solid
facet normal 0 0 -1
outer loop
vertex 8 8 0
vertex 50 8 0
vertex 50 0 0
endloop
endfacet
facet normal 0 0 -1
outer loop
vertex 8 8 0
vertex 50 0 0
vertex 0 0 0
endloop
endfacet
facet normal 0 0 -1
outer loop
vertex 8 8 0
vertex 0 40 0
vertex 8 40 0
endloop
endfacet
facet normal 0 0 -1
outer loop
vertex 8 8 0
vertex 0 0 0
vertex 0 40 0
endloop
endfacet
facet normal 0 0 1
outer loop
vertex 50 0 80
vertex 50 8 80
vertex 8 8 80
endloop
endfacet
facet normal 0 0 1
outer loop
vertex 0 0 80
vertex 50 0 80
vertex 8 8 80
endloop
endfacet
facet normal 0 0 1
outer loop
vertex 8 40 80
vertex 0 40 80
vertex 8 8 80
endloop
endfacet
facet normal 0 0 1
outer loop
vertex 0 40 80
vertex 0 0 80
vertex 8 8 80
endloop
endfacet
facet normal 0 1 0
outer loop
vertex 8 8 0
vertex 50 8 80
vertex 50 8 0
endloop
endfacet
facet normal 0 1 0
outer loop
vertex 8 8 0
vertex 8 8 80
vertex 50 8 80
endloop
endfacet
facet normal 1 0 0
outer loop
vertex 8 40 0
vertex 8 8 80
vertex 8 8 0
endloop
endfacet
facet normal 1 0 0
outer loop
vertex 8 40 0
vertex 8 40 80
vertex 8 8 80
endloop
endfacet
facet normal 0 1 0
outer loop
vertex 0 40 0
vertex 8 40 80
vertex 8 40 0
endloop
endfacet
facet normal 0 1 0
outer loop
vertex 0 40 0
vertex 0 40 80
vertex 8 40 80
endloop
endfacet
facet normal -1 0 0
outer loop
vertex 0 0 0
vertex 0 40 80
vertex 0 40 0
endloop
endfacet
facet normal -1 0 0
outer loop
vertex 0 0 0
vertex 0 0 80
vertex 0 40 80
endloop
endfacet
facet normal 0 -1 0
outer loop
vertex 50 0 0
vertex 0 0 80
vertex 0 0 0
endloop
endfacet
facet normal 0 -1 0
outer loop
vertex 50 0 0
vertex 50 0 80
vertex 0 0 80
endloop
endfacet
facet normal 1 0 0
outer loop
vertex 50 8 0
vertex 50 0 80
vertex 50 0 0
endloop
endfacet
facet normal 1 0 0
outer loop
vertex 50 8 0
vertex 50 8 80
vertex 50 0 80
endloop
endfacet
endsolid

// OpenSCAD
$fn = 32;

// ----------------------------------------------------------------------
// Structural section: angle 50 x 40 mm
// ----------------------------------------------------------------------

// --- parameters (mm) ---
sec_w = 50;               // leg width, X
sec_h = 40;               // leg height, Y
flange_t = 8;             // leg thickness
plate_t = 80;             // cut length, Z (extrusion height)

profile = [[0, 0], [50, 0], [50, 8], [8, 8], [8, 40], [0, 40]];  // primary outline, 6 points, counter clockwise

// --- the one profile operation ---
linear_extrude(height = plate_t) polygon(points = profile);
